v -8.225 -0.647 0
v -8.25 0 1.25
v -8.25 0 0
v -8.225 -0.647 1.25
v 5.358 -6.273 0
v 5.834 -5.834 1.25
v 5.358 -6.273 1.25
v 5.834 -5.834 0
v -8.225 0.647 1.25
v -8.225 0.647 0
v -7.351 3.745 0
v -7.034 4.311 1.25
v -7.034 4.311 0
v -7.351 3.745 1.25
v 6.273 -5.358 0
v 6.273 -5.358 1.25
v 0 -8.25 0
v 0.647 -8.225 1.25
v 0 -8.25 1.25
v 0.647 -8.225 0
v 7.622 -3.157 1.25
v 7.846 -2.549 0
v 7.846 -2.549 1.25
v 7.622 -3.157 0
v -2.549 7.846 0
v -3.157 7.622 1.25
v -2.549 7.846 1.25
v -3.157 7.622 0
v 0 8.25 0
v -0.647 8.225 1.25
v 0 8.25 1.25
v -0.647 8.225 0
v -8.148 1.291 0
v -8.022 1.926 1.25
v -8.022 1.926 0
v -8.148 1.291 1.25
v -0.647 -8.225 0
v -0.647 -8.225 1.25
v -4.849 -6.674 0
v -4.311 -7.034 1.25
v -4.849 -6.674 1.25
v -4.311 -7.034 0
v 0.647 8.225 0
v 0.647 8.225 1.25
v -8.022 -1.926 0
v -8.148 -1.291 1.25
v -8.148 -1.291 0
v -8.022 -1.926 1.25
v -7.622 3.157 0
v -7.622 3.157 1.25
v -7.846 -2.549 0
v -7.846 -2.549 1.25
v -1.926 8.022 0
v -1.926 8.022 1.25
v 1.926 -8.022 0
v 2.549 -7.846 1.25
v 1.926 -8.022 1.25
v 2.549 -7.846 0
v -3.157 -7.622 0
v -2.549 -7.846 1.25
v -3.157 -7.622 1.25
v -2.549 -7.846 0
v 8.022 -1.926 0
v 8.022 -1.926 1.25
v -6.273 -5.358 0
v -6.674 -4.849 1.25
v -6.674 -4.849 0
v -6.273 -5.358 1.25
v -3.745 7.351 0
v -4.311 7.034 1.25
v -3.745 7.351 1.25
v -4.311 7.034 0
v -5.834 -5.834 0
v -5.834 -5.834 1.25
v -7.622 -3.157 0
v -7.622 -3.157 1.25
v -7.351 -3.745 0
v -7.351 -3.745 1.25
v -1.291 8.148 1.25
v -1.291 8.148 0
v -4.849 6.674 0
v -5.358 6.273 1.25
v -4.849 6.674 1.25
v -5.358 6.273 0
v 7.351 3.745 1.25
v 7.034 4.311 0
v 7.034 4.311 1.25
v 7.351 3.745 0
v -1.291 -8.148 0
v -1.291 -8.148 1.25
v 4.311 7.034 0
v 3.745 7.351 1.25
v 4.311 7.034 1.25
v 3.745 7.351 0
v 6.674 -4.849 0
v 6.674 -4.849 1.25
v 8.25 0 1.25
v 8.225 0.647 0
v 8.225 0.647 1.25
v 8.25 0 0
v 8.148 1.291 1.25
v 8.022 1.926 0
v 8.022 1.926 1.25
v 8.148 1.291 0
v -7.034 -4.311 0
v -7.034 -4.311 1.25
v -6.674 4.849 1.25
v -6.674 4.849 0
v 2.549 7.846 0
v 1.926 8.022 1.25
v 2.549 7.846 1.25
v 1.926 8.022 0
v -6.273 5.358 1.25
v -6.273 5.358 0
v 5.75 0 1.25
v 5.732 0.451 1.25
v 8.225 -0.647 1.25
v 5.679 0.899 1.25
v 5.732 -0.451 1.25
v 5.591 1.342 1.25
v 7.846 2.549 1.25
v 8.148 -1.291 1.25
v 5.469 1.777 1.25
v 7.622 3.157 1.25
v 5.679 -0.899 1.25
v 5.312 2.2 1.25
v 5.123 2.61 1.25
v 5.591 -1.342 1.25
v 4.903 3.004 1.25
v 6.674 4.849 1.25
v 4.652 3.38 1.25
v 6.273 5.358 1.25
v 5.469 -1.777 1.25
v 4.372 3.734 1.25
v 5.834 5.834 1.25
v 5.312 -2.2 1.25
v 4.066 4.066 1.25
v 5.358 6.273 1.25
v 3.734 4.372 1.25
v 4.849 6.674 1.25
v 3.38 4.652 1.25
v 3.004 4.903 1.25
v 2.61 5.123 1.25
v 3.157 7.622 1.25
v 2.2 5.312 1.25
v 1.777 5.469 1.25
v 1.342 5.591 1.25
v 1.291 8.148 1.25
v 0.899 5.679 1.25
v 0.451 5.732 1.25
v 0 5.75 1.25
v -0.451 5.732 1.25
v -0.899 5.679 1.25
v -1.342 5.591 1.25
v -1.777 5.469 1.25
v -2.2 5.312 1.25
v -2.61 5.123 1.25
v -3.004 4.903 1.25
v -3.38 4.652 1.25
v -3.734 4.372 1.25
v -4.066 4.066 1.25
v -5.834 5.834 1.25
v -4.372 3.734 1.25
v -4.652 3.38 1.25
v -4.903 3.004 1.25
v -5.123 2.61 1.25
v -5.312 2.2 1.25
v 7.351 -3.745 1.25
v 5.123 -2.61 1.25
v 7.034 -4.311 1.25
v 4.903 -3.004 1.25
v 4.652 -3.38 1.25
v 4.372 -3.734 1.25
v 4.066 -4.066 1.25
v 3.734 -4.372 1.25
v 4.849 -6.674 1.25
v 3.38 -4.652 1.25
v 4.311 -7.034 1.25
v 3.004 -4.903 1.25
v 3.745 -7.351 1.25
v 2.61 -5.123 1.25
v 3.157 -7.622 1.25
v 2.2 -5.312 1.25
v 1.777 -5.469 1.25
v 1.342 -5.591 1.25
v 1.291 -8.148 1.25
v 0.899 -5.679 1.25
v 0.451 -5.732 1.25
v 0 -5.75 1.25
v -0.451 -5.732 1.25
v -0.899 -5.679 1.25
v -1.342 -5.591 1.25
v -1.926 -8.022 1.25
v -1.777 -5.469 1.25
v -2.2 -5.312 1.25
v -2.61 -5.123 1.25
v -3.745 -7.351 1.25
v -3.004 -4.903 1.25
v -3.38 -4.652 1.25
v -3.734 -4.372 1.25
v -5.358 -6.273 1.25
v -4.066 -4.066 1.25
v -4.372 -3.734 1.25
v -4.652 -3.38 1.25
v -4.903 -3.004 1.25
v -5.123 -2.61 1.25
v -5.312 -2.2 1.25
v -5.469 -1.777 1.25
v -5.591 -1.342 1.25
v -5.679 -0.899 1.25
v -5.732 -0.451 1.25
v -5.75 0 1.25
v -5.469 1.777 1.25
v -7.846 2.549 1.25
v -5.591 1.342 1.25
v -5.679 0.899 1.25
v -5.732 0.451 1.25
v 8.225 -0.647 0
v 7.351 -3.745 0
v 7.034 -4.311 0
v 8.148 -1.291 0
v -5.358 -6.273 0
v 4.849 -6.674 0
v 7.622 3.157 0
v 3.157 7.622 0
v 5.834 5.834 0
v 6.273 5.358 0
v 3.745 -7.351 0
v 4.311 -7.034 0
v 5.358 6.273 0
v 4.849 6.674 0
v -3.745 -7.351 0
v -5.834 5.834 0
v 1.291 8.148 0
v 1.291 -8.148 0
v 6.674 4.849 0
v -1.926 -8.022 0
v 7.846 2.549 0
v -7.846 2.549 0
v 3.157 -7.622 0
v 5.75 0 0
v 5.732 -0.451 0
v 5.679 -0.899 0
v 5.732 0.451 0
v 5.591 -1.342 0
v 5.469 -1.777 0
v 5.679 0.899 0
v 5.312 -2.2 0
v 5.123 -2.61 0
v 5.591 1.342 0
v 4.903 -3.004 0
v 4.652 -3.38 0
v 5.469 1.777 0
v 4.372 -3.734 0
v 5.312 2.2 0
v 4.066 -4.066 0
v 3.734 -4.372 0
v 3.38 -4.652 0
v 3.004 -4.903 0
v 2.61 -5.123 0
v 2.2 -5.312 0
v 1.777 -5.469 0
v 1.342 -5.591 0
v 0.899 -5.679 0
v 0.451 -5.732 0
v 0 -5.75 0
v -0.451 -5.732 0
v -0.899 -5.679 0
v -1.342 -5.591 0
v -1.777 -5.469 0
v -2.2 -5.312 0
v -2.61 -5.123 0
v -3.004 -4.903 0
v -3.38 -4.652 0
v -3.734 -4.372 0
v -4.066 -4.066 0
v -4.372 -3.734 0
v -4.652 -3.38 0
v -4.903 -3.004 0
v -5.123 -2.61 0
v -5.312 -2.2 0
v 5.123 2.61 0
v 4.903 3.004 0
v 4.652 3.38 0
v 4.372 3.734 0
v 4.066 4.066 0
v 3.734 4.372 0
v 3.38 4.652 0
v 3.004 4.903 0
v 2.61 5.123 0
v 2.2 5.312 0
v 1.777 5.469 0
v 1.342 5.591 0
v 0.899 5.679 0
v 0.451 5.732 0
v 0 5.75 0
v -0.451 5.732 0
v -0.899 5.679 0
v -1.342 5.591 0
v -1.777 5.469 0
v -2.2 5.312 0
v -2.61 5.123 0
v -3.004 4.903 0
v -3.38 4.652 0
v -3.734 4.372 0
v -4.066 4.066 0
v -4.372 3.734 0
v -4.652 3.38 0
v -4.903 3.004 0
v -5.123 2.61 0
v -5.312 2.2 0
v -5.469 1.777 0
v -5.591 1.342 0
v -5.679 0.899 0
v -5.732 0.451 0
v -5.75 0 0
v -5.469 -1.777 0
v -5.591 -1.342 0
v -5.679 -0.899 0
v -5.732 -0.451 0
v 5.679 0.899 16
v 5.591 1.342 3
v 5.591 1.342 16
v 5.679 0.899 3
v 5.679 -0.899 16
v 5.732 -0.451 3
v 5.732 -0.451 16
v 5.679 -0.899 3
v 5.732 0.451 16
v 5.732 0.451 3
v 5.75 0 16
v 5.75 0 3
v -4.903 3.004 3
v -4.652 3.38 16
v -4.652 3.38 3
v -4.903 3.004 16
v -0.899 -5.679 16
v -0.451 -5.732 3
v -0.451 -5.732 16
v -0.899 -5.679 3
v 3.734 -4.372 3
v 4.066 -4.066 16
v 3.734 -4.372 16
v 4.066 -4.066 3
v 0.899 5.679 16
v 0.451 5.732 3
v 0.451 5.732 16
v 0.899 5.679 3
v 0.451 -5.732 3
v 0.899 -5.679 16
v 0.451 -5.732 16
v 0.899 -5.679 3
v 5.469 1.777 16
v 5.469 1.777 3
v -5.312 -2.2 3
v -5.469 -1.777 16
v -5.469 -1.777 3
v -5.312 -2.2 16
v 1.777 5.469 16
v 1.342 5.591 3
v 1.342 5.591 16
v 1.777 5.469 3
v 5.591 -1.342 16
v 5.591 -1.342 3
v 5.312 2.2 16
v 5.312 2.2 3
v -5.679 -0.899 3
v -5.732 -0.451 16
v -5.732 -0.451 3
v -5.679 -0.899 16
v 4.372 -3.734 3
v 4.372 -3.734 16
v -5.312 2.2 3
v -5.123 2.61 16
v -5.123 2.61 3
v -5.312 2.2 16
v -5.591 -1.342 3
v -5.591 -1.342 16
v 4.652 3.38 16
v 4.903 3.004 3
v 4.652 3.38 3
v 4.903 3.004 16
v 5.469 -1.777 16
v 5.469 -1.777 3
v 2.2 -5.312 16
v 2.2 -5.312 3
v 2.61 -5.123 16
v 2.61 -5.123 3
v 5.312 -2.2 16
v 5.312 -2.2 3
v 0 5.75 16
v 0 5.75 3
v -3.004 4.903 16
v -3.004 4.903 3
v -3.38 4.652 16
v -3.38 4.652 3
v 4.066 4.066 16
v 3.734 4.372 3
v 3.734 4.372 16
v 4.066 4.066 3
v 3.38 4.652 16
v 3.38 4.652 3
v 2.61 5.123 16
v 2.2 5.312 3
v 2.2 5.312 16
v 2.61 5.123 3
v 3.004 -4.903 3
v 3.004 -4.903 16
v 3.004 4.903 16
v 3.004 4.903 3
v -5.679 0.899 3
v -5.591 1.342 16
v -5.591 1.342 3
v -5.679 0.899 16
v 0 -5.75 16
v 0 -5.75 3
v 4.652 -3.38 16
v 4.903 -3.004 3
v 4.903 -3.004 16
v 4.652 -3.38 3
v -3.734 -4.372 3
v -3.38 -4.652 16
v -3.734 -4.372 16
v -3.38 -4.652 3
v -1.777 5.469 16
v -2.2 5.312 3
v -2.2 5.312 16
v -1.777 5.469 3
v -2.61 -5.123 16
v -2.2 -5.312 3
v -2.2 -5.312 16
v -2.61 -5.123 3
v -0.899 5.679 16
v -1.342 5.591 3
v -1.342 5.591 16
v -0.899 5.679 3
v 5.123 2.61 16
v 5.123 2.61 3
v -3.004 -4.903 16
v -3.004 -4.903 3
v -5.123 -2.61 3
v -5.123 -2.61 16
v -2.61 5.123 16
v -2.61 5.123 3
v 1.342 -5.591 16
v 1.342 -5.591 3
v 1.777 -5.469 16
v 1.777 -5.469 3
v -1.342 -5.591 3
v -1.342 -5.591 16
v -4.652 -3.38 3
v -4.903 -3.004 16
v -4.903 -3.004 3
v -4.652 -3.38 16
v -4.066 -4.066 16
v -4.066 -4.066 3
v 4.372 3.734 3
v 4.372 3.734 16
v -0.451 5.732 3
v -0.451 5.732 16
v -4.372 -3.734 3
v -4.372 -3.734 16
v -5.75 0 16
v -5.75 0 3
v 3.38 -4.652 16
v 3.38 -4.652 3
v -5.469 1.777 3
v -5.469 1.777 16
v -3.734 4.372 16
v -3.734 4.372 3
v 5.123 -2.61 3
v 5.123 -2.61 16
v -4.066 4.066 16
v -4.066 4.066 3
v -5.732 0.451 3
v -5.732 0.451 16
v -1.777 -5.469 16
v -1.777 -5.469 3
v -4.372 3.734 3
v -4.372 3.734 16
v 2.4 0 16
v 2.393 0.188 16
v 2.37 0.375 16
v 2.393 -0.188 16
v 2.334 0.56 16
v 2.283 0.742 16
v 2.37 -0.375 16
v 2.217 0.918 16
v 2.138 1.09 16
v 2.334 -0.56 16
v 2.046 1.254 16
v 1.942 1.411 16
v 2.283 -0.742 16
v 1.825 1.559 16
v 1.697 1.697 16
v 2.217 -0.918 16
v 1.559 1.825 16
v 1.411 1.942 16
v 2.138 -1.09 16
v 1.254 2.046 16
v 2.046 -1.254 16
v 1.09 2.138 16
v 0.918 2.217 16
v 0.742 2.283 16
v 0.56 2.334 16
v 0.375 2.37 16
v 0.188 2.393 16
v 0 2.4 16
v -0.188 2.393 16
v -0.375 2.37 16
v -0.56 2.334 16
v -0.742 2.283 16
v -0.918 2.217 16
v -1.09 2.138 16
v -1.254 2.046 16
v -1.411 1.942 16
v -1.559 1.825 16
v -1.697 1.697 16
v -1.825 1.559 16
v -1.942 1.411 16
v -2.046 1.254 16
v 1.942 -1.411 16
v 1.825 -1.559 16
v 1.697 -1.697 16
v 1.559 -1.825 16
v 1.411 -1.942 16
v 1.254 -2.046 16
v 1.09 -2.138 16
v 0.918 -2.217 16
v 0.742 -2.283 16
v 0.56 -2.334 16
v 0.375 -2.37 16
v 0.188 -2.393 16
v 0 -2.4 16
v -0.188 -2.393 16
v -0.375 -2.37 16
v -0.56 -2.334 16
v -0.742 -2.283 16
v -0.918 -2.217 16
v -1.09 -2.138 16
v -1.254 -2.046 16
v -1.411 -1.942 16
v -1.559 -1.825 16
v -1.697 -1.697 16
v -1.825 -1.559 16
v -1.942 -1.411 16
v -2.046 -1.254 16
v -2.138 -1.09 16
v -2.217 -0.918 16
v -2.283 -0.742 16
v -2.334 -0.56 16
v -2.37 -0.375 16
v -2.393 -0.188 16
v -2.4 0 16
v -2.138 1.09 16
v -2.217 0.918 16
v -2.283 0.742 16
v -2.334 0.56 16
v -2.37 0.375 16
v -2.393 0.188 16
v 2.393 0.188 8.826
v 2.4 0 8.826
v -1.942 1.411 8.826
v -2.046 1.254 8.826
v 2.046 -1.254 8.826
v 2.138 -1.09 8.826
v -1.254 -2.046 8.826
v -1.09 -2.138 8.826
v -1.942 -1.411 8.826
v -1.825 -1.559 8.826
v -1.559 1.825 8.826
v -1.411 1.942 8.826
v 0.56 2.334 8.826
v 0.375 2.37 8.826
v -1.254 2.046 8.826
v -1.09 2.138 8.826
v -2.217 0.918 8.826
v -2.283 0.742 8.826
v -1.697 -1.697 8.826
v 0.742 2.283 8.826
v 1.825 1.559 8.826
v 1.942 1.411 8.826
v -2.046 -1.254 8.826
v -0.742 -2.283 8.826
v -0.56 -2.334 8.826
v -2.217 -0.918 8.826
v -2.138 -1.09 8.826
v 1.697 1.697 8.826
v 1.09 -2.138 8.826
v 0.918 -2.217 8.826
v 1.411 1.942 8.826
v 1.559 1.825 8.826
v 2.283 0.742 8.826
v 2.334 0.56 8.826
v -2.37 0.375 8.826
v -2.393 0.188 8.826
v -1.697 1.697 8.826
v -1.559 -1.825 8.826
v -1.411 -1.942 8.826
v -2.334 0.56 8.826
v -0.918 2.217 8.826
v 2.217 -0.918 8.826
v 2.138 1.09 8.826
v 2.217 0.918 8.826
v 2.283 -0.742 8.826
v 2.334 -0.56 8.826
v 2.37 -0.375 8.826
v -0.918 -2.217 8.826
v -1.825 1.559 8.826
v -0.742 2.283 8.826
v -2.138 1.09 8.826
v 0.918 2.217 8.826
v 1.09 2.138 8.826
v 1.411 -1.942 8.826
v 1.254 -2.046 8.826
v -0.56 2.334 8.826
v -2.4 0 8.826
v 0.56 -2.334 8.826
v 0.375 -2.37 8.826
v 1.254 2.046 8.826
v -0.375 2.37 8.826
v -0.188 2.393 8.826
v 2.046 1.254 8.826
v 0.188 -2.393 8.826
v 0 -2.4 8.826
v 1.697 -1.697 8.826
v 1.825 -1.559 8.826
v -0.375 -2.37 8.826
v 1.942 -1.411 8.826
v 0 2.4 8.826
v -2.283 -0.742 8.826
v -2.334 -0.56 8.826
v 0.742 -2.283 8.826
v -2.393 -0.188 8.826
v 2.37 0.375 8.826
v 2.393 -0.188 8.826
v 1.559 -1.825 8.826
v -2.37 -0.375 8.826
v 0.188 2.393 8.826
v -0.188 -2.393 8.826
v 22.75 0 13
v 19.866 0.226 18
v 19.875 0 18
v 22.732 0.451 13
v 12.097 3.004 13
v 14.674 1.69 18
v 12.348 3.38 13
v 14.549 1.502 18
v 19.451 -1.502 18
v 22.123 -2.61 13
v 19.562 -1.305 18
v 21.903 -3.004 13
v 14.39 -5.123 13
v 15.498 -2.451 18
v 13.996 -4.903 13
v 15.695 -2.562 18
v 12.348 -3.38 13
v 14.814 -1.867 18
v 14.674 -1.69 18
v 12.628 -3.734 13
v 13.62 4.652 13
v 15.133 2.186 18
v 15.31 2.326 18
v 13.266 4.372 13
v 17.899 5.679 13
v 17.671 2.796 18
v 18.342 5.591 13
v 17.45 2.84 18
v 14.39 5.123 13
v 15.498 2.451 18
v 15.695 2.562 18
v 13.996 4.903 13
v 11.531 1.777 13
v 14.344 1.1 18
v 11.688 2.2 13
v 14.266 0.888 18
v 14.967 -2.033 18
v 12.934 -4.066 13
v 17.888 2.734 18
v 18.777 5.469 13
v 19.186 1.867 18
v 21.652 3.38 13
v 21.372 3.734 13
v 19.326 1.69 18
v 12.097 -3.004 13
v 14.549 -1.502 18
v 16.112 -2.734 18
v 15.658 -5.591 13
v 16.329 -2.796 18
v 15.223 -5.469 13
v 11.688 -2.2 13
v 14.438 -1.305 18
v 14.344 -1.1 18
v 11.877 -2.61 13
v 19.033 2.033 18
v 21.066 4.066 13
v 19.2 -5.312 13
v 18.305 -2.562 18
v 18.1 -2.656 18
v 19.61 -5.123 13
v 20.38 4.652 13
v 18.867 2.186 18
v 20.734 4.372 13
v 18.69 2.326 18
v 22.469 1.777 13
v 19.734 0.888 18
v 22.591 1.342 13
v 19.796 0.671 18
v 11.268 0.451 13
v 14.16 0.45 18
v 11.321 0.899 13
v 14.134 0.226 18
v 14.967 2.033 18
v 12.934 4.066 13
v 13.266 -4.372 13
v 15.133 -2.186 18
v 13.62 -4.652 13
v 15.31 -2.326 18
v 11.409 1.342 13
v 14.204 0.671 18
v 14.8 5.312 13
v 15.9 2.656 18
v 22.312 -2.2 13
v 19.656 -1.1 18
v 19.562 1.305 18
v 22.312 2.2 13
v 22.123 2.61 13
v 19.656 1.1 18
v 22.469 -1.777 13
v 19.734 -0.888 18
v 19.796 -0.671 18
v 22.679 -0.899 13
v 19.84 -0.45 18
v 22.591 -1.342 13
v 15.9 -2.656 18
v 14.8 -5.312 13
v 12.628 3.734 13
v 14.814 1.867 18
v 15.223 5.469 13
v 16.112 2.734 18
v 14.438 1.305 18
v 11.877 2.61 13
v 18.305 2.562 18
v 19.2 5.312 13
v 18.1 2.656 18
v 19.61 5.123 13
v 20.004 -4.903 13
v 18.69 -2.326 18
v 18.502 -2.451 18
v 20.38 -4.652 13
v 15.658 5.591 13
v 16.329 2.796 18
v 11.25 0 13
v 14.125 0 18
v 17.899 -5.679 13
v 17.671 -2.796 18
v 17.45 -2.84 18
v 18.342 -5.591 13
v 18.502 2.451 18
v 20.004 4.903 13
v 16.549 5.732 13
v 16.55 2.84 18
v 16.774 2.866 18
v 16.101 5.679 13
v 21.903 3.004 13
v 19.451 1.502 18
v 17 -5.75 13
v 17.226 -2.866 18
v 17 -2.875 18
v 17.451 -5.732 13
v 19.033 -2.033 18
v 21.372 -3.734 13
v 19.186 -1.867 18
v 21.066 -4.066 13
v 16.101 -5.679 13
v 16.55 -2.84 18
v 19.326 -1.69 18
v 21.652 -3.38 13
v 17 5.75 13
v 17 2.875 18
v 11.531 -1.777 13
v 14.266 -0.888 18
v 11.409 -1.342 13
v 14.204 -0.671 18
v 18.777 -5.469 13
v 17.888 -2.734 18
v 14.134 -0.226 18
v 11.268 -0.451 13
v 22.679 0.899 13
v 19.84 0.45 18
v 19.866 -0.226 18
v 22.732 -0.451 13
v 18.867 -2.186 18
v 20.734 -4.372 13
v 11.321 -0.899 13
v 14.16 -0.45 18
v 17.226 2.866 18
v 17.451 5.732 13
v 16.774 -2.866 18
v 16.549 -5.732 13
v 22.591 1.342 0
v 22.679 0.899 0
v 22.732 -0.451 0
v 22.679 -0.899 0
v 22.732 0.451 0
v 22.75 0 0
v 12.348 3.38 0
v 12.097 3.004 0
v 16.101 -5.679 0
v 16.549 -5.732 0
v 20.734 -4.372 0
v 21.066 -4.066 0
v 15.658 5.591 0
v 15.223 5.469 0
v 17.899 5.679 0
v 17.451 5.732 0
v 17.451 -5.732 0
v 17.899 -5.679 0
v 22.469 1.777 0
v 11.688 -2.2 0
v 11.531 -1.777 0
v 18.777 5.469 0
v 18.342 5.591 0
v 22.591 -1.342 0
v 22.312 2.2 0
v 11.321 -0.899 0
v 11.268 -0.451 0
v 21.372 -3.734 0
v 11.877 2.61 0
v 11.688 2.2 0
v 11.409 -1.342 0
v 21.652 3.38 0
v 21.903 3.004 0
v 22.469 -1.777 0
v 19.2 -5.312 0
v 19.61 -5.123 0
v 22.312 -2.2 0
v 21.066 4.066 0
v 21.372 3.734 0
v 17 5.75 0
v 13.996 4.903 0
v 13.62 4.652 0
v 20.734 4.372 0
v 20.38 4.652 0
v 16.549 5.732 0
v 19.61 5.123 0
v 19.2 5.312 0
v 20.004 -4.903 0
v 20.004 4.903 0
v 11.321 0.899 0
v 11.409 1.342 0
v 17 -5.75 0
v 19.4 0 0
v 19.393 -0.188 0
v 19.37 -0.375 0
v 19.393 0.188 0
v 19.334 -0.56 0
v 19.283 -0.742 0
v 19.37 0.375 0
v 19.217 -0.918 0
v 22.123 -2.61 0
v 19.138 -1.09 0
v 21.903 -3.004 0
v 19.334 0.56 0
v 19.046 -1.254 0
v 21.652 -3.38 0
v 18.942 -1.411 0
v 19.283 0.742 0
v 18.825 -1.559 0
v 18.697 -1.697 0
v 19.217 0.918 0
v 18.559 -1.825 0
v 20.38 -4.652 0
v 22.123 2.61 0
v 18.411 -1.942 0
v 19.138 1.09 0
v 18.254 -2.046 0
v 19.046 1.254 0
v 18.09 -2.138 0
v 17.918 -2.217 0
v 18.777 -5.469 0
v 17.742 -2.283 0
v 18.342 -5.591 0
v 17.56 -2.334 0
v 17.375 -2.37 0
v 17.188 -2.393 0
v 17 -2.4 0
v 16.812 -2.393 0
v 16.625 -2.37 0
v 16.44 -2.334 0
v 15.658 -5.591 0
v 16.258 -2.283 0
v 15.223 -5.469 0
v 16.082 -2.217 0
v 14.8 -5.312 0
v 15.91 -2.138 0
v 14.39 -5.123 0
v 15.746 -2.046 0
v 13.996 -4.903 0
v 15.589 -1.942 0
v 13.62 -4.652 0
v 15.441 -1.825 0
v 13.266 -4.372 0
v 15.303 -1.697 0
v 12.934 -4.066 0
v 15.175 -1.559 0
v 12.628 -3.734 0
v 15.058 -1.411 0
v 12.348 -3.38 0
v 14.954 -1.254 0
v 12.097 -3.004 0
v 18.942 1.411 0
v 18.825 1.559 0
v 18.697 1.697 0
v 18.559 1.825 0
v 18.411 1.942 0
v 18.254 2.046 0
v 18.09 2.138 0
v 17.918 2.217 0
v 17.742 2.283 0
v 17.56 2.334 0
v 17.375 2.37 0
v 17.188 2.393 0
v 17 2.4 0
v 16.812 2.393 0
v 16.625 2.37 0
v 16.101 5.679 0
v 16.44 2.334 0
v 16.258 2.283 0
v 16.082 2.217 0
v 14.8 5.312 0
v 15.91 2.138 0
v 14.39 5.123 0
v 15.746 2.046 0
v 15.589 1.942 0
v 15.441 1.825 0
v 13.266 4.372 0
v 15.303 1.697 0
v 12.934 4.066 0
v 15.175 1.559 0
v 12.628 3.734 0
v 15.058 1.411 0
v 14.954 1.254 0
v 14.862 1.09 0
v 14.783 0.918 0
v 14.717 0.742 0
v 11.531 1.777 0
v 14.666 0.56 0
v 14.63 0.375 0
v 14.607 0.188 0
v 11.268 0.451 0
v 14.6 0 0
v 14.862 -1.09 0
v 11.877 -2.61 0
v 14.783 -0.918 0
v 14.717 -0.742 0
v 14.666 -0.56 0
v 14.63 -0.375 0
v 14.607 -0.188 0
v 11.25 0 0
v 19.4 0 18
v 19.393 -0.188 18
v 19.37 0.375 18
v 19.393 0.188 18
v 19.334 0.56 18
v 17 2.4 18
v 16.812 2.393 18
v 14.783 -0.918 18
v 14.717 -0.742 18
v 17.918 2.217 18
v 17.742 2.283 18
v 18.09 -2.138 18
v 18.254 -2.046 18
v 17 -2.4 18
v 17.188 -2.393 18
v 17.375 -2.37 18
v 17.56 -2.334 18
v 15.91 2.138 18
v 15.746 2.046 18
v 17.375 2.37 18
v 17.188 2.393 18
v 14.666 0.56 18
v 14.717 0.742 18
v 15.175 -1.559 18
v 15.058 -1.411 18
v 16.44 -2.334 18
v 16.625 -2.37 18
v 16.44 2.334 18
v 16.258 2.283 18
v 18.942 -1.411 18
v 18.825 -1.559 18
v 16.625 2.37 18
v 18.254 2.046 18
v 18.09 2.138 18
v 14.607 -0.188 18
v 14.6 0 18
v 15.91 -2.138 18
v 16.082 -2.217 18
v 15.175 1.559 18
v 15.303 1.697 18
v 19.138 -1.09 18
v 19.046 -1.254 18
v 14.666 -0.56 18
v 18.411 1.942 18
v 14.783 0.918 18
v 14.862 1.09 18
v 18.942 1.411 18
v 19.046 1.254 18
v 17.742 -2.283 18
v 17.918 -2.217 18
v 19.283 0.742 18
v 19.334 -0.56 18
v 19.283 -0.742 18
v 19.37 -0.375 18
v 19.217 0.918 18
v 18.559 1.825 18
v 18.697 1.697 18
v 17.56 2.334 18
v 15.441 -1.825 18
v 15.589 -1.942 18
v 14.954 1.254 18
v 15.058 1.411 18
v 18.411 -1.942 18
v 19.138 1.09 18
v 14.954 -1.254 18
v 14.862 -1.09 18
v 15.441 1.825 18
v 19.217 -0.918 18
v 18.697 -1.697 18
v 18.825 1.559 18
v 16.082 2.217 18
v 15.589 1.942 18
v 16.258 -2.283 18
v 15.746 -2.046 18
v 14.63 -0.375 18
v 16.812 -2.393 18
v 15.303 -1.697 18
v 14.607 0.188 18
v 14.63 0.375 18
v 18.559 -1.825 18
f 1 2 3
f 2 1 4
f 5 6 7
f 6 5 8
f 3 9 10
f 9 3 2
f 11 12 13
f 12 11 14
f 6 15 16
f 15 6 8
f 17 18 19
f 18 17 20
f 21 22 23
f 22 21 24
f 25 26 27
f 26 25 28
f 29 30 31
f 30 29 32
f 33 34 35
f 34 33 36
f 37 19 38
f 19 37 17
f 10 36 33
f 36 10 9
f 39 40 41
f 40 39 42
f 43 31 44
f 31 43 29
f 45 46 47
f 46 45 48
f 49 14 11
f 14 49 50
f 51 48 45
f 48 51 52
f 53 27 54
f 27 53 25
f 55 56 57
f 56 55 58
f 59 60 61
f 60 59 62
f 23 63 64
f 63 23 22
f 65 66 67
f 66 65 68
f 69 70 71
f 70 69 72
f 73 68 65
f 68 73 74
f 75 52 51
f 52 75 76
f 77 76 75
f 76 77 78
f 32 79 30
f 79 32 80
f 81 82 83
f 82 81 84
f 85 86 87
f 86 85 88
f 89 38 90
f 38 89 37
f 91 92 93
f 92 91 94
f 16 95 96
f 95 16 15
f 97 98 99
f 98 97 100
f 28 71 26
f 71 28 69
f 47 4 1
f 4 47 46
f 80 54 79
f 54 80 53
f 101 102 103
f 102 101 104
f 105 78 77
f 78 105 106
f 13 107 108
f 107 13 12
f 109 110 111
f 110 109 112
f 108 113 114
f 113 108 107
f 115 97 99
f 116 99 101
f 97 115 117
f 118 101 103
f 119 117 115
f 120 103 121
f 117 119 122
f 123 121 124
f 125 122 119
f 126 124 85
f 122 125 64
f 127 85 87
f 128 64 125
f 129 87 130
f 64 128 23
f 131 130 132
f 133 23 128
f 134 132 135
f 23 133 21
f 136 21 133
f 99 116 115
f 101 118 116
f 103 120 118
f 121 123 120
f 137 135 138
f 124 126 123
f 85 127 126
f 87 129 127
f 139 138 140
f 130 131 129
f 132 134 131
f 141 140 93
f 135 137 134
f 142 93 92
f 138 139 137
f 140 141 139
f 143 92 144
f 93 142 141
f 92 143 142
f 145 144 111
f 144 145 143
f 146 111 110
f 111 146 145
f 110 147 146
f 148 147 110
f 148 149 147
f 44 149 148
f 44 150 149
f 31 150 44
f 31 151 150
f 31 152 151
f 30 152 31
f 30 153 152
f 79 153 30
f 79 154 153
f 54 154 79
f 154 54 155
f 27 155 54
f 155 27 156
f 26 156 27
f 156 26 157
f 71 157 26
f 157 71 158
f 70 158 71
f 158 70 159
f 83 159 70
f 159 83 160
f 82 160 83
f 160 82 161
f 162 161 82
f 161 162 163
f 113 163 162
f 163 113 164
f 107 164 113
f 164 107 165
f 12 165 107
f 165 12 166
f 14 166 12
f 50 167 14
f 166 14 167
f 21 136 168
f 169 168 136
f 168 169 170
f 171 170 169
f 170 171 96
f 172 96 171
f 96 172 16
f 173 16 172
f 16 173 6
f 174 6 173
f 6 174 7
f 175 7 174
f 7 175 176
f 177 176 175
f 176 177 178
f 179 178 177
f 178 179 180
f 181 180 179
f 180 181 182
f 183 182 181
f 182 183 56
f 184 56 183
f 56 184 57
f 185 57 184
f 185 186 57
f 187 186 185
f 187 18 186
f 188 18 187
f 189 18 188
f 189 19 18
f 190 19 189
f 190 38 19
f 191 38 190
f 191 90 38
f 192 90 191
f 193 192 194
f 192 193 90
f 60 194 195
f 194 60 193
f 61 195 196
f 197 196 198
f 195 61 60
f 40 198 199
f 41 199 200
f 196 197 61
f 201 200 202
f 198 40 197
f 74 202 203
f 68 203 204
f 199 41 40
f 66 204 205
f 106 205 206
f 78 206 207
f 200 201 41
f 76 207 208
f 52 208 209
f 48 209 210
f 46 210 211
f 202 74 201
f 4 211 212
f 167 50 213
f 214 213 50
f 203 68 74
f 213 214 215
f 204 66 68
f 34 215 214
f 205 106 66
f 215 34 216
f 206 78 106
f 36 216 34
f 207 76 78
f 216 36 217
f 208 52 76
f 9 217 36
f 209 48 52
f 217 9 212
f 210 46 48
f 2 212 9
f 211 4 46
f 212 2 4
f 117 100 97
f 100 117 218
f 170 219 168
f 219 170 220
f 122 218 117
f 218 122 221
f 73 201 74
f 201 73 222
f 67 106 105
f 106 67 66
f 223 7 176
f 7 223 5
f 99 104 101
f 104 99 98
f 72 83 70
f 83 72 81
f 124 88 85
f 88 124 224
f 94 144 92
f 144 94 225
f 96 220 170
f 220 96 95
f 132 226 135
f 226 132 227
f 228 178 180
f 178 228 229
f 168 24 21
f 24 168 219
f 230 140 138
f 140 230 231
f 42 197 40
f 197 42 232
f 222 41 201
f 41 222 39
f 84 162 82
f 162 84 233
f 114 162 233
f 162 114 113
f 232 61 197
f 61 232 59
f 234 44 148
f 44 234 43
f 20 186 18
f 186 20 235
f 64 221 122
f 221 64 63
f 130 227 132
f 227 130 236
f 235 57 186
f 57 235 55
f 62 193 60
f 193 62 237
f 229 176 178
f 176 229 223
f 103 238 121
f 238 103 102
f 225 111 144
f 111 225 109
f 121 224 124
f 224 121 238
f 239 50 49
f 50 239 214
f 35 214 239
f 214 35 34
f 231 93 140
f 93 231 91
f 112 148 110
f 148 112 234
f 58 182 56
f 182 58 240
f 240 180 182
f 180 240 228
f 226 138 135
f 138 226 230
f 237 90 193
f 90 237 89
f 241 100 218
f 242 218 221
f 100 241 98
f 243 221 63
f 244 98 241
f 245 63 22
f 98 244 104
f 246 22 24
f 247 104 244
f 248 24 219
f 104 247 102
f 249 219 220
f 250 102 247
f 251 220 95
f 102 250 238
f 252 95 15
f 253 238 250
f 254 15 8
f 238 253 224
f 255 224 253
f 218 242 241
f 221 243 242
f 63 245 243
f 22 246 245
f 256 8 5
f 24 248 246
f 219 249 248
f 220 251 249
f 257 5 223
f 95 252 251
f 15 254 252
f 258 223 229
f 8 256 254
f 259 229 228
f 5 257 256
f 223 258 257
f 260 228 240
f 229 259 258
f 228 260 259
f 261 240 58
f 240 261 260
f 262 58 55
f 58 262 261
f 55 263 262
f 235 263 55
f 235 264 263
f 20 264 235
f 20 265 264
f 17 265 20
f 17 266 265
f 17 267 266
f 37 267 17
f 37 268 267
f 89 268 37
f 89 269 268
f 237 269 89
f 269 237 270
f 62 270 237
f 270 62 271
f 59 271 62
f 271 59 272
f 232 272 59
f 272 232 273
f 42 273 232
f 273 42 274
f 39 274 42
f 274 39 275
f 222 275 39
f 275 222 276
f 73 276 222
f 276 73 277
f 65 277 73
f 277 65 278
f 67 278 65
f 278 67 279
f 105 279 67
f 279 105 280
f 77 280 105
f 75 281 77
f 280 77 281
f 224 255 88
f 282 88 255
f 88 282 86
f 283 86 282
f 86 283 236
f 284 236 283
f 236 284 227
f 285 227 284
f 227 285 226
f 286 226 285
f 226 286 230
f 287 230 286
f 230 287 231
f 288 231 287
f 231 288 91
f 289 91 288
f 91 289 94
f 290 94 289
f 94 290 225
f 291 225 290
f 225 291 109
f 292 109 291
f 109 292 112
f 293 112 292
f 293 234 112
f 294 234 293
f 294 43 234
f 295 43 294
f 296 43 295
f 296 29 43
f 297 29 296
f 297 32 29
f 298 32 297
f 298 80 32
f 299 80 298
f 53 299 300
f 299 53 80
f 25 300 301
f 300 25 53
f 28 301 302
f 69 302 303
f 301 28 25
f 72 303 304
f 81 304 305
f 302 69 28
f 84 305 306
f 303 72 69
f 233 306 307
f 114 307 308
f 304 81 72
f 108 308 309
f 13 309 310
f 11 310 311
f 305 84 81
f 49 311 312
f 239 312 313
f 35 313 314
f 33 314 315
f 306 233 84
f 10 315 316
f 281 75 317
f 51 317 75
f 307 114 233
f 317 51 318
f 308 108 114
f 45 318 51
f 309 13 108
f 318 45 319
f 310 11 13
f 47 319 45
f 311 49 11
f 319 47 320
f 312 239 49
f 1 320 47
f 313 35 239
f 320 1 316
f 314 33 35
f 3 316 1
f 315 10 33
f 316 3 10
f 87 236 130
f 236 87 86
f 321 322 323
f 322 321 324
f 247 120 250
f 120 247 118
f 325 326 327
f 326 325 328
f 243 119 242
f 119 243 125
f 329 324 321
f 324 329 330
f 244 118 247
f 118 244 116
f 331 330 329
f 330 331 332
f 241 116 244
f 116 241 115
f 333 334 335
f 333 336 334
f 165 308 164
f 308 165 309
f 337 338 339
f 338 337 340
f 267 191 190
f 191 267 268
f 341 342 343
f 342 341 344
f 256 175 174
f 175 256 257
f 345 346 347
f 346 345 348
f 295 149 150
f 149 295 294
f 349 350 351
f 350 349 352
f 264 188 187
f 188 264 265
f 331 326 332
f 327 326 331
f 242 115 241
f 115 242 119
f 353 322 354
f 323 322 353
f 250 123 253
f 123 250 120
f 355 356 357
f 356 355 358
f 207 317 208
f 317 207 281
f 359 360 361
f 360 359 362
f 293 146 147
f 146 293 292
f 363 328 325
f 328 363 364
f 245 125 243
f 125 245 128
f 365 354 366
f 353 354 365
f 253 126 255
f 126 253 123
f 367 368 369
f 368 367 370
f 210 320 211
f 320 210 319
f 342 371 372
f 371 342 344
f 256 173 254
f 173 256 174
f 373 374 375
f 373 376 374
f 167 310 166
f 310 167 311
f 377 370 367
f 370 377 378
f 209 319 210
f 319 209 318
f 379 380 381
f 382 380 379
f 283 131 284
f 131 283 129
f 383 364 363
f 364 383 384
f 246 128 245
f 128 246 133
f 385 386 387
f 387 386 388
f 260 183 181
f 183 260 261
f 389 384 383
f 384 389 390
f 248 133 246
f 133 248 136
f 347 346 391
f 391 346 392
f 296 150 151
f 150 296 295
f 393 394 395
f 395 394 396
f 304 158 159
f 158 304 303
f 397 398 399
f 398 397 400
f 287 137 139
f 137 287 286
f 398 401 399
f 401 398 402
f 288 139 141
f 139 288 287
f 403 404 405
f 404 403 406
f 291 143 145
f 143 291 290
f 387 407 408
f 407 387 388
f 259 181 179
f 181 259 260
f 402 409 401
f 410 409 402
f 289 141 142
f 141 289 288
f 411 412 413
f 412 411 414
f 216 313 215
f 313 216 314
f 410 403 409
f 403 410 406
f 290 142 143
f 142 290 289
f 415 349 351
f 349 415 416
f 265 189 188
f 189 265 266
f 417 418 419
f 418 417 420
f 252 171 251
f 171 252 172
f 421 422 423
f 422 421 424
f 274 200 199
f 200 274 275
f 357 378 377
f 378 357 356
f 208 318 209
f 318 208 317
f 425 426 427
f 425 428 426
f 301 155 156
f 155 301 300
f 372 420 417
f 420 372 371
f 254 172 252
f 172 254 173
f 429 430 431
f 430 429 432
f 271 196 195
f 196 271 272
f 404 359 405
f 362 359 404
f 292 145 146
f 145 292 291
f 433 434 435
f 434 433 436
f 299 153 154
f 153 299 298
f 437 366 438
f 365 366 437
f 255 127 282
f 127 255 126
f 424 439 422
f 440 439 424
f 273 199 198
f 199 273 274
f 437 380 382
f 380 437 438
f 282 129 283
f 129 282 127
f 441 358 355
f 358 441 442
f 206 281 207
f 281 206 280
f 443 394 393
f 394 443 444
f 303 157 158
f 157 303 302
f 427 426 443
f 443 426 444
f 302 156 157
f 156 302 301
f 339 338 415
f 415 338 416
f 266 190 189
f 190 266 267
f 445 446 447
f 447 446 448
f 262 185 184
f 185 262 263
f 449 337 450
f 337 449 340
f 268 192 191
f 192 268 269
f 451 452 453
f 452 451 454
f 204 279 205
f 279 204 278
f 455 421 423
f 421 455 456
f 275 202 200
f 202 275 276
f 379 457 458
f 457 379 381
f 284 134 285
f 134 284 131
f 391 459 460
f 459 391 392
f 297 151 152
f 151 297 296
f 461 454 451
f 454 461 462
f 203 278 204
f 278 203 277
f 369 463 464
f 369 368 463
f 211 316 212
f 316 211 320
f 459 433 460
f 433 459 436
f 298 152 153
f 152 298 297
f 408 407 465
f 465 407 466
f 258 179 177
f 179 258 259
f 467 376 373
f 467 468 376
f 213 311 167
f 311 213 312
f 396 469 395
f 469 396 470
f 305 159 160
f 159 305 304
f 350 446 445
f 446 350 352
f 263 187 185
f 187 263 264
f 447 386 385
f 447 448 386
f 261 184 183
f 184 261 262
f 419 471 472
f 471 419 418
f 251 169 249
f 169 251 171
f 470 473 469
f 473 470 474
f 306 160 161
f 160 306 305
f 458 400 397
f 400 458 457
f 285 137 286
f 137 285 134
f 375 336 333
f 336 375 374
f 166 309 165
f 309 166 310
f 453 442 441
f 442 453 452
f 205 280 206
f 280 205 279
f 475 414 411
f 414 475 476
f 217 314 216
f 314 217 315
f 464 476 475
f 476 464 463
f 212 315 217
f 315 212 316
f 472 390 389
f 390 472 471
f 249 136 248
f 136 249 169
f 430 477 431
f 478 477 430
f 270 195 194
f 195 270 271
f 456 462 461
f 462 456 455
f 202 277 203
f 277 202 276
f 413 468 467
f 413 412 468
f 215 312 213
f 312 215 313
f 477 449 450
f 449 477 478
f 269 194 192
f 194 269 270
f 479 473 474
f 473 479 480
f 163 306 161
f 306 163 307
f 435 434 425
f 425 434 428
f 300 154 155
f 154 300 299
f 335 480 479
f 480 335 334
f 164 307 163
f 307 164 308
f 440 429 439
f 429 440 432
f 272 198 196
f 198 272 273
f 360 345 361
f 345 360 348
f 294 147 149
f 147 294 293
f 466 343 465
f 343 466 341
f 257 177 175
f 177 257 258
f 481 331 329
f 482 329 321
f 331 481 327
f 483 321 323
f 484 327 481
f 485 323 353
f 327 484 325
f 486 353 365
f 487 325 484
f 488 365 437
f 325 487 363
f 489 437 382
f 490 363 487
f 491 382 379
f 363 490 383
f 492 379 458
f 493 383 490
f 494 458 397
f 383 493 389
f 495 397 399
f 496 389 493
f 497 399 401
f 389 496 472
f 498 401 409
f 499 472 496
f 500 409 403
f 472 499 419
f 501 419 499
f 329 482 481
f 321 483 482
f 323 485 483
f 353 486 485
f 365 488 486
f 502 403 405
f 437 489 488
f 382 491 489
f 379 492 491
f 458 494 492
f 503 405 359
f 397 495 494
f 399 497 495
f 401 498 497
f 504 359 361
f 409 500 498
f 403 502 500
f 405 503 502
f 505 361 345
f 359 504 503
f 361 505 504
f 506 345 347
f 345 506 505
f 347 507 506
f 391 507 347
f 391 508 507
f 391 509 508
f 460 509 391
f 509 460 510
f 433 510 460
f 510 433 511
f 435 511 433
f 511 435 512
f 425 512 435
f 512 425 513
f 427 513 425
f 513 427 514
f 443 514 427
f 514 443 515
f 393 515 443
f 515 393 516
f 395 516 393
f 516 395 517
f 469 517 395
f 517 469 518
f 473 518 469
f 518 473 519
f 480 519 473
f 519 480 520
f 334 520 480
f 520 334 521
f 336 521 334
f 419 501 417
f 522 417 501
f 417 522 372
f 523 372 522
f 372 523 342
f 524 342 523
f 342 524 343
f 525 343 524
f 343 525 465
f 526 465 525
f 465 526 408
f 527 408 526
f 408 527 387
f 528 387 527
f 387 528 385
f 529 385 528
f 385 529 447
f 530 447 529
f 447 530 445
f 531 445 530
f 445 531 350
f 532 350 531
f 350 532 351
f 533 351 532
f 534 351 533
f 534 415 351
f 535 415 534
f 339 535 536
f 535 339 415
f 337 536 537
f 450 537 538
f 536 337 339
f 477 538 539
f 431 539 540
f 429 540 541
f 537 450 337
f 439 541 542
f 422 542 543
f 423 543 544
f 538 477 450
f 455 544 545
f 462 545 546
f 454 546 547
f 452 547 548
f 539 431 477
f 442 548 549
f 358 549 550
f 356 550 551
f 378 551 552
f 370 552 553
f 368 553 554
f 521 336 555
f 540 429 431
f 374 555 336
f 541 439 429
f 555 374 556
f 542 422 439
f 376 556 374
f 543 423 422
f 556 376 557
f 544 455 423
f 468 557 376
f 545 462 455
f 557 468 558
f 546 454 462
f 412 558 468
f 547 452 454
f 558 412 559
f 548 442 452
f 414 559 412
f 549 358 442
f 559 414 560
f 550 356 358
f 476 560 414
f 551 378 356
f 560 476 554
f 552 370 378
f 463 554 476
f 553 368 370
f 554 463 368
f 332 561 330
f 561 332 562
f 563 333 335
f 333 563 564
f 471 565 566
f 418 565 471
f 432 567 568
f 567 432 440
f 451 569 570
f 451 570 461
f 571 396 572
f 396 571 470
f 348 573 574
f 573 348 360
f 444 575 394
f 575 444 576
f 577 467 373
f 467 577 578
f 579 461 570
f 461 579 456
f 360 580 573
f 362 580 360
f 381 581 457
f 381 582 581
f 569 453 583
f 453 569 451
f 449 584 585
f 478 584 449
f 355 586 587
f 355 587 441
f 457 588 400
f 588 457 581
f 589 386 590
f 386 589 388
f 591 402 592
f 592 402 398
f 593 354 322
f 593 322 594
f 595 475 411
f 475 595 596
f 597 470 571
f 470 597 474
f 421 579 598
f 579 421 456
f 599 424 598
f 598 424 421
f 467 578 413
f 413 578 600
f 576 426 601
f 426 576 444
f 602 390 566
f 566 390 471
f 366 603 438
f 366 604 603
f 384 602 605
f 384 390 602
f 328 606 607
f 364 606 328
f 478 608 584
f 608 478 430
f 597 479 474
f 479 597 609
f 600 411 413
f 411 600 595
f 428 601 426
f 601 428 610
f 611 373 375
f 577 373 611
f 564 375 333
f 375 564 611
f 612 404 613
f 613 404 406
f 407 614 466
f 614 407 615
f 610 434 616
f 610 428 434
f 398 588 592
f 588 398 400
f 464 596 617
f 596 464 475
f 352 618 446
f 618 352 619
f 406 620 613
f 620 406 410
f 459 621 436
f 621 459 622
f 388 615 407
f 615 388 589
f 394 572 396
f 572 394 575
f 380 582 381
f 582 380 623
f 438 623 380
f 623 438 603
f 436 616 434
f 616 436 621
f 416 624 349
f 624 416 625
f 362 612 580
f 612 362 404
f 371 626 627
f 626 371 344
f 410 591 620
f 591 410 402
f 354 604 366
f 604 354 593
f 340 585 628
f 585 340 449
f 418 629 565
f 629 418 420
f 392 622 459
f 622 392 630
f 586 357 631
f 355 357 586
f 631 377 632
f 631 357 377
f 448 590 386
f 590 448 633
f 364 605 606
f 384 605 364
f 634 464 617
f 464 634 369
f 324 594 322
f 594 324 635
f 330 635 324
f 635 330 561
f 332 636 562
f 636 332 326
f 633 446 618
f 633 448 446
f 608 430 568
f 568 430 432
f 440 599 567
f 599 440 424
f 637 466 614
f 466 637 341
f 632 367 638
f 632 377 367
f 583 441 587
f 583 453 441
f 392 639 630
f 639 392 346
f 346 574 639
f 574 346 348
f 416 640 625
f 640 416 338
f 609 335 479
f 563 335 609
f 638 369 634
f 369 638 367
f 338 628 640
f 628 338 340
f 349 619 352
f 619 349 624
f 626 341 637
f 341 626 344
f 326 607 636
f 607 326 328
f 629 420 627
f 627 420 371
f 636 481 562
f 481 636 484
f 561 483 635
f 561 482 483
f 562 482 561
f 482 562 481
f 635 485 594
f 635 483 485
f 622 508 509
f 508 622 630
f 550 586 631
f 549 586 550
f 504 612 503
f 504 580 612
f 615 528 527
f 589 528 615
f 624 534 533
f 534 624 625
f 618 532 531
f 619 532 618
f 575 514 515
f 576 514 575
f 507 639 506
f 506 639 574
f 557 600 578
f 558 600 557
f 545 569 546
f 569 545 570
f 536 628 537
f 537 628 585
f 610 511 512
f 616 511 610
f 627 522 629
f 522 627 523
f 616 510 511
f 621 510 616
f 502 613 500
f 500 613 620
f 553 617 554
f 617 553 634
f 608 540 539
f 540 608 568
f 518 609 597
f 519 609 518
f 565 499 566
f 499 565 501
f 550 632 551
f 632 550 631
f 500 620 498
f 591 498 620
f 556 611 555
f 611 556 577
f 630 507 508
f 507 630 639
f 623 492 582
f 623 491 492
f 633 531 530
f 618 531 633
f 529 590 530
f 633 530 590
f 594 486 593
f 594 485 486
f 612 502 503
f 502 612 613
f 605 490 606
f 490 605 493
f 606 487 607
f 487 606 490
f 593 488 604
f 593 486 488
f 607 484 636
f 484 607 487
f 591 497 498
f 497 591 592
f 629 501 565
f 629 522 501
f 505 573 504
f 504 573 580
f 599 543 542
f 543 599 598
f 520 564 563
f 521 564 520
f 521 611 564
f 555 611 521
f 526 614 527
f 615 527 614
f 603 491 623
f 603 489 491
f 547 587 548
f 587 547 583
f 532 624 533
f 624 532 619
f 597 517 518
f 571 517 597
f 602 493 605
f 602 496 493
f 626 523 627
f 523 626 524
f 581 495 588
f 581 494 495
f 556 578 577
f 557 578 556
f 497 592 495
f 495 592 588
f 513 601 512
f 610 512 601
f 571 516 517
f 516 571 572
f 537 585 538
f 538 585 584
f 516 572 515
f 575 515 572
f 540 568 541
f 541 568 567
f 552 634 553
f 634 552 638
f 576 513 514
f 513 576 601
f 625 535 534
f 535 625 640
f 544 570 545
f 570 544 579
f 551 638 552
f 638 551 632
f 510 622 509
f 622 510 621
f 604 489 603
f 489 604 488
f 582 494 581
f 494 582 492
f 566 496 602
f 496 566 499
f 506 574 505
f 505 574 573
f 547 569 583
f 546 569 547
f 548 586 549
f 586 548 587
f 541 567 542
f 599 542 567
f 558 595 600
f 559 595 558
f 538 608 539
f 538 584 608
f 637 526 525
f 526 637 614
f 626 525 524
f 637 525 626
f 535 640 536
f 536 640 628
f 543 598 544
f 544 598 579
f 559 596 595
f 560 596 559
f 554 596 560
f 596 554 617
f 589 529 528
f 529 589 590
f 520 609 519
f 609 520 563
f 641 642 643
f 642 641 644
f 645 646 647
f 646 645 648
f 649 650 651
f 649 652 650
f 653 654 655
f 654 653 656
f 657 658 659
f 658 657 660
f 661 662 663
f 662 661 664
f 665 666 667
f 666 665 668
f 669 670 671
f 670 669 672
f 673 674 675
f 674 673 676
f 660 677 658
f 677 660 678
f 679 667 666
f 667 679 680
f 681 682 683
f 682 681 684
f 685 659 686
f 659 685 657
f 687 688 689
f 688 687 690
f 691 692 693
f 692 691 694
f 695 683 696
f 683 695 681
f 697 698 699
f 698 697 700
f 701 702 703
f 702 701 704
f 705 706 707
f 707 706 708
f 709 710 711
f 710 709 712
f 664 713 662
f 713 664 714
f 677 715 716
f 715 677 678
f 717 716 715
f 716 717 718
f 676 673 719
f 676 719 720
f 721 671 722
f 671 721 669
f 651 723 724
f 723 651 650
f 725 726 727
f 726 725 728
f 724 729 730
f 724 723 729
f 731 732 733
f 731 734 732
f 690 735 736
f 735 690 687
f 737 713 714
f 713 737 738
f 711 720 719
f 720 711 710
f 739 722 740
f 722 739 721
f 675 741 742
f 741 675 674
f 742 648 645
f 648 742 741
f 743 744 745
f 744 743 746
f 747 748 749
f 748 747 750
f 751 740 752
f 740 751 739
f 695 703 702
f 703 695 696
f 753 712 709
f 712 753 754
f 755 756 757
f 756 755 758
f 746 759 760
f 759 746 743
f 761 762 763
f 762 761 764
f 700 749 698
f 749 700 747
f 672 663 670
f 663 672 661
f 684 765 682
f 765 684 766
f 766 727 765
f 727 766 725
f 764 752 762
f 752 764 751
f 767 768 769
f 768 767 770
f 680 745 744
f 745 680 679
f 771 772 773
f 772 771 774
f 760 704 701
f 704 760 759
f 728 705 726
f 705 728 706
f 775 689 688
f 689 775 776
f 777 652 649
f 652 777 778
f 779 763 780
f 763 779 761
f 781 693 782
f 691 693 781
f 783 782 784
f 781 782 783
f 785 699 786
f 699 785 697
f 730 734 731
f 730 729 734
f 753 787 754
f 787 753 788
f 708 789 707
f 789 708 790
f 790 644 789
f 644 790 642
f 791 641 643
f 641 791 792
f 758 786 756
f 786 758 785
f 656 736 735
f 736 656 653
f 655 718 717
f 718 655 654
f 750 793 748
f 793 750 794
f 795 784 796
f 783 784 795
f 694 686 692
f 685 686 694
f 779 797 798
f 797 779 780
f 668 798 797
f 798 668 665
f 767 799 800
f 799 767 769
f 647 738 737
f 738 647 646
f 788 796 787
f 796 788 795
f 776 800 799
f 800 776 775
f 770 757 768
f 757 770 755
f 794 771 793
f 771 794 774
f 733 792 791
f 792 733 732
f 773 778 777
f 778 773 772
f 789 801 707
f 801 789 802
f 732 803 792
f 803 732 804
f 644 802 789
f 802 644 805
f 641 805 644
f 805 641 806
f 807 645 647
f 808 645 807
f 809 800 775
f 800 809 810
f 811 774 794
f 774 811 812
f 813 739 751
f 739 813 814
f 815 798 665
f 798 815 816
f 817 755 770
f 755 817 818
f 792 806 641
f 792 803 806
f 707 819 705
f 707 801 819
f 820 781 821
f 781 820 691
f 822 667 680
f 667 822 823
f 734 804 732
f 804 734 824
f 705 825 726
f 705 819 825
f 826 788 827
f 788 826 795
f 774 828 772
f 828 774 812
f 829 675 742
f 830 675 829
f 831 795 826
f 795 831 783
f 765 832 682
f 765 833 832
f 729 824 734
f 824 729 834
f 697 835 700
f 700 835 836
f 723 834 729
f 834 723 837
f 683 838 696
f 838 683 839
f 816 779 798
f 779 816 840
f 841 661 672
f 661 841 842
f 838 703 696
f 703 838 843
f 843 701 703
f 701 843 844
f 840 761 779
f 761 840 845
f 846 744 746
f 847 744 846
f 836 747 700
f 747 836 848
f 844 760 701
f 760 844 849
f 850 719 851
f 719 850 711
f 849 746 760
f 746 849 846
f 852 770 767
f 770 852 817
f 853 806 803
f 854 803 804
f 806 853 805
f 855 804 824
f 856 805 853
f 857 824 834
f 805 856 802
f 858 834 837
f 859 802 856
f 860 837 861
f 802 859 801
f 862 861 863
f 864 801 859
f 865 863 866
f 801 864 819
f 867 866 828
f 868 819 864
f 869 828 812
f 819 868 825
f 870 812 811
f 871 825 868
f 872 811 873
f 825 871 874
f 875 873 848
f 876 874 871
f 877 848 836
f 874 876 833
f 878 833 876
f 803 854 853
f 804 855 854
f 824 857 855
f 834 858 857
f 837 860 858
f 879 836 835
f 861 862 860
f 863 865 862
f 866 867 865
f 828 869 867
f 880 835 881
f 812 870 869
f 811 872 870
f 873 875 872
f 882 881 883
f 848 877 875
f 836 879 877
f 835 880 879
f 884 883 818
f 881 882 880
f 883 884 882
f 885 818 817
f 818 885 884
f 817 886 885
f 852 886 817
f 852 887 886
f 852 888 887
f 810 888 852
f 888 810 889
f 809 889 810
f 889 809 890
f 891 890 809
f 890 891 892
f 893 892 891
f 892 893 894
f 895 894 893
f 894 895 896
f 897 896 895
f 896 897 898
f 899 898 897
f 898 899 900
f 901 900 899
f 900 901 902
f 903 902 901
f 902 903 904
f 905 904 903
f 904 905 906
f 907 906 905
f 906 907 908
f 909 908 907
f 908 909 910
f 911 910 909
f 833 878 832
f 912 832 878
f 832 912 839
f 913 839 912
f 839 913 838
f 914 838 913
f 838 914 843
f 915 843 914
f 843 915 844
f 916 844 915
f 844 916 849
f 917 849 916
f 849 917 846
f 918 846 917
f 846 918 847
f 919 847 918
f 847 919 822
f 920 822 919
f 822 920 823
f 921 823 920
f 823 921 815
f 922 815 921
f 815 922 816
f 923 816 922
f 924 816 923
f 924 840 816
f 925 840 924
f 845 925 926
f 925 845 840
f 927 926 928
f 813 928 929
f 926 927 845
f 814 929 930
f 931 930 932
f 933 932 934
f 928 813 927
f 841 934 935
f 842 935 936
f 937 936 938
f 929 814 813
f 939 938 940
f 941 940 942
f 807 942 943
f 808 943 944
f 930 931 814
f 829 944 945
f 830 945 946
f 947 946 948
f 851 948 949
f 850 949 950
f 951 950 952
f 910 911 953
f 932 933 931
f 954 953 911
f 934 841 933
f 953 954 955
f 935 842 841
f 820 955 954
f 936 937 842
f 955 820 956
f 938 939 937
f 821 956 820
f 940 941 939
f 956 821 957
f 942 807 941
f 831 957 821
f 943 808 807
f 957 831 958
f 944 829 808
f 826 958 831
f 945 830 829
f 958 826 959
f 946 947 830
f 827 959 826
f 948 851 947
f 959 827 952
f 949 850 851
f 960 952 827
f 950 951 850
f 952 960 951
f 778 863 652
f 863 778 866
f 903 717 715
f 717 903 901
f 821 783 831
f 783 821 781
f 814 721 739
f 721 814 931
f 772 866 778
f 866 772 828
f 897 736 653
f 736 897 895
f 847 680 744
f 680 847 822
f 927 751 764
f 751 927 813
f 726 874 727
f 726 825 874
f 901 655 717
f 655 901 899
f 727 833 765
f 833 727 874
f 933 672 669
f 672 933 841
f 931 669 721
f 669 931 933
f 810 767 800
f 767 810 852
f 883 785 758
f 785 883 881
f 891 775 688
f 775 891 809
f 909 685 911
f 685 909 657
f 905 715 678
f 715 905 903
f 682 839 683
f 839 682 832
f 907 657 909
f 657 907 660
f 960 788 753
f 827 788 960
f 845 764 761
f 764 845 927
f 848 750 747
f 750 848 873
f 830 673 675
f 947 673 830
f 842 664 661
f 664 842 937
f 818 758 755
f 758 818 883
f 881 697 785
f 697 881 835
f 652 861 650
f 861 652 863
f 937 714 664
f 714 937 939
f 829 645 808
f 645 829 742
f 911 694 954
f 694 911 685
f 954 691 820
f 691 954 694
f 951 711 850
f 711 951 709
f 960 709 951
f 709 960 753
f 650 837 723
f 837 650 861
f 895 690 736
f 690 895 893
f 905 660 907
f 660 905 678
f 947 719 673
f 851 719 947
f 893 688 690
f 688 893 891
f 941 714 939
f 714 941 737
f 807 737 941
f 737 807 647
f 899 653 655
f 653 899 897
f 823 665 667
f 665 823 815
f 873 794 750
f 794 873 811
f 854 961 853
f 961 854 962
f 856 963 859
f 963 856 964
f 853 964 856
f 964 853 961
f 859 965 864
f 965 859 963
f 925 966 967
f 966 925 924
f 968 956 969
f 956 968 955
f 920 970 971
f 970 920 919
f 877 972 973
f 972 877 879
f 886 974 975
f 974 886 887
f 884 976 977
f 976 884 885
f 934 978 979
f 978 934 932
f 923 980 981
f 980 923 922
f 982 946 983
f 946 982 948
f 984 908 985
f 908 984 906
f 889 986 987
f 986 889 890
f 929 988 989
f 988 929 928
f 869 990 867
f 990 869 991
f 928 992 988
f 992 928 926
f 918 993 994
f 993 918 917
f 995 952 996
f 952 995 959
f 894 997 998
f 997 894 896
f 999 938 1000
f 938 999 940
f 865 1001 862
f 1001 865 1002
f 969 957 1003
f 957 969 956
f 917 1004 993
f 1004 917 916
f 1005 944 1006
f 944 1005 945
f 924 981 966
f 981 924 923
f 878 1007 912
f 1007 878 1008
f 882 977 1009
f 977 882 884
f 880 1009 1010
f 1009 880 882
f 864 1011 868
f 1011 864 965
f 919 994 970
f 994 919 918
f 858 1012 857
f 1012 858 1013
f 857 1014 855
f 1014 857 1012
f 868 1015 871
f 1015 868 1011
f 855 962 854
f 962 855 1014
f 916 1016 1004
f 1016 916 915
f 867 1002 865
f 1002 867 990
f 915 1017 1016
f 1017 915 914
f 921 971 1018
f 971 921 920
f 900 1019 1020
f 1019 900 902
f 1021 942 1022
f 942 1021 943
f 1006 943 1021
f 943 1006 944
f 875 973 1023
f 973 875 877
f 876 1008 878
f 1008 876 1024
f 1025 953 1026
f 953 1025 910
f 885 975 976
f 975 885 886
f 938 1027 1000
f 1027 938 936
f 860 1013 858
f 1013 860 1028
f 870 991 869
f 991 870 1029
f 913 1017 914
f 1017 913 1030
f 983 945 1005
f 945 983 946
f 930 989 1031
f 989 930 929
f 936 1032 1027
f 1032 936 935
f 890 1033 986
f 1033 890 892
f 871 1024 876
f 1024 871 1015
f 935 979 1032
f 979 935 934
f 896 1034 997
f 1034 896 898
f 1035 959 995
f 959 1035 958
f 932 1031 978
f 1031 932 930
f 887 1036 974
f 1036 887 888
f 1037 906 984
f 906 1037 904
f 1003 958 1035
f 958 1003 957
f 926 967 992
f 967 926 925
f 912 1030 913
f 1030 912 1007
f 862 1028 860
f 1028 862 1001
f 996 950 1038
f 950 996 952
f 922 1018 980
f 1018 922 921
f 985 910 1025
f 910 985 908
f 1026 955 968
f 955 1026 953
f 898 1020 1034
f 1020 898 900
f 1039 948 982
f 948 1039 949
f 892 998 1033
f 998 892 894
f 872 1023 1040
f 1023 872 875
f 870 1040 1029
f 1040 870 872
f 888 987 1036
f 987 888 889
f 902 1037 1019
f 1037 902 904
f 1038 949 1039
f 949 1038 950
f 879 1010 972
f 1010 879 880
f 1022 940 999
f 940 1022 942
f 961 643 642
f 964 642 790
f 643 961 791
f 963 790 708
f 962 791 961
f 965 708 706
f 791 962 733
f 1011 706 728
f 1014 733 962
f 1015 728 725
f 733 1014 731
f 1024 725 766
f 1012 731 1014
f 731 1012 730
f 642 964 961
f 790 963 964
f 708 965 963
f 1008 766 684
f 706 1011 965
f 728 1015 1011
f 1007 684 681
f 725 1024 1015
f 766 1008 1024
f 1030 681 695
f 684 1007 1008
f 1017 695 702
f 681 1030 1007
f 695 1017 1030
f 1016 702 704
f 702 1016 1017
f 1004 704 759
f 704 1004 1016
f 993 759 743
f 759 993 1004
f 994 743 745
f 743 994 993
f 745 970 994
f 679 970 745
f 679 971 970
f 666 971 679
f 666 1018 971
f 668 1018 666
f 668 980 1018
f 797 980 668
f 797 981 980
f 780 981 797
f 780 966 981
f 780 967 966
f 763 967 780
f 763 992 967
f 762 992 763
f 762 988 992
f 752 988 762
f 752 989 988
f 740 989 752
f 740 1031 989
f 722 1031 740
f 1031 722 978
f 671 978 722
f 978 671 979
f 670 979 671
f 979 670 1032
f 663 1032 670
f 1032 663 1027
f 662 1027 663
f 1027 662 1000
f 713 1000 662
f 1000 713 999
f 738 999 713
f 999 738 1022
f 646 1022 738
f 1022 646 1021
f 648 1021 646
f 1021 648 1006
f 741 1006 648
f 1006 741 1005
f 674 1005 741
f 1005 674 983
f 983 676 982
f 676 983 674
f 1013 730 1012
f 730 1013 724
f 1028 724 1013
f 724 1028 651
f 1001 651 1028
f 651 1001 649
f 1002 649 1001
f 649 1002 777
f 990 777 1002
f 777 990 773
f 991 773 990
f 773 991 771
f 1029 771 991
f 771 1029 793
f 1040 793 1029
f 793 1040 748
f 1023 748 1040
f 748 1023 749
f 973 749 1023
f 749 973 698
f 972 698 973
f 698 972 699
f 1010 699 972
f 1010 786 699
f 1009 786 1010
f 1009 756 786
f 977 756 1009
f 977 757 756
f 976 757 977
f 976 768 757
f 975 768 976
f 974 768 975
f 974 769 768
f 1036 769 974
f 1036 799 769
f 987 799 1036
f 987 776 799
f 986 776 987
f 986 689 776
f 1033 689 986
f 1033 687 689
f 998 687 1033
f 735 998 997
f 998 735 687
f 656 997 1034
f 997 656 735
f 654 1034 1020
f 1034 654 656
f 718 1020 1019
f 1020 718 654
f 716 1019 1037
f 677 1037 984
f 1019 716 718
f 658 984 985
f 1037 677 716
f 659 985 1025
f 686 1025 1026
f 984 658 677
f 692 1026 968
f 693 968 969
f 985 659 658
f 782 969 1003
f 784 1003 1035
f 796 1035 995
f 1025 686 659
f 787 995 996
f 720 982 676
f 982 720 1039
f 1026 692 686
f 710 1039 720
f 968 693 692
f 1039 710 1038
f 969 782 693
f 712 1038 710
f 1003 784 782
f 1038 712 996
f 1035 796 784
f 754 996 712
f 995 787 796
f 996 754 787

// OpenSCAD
// file: common.scad
// Measurements and routines common across adapters.

band_full_thickness = 1.25;    // thickest point of the band
band_full_diameter = 16.5;  // diameter at widest point of band

// profile = [
//     [0,0],
//     [band_edge_diameter / 2, 0],
//     [band_full_diameter / 2, (band_full_thickness - band_edge_thickness) / 2],
//     [band_full_diameter / 2, band_full_thickness - ((band_full_thickness - band_edge_thickness) / 2)],
//     [band_edge_diameter / 2, band_full_thickness],
//     [0,band_full_thickness],
// ];

profile = [
    [0,0],
    [band_full_diameter / 2, 0],
    [band_full_diameter / 2, band_full_thickness],
    [0,band_full_thickness],
];

module band() {
    rotate_extrude($fn=80) polygon(points=profile);
}
// main file
// Plotter pen adapter for Pentel Slicci gel pens
//
// Modified by Sasha Kovar <sasha-thing@arcocene.org>
// from a design by Brian Boucheron <brian@boucheron.org>

include <common.scad>;

body_outer_diameter = 11.5;
body_inner_diameter = 4.8;
body_height1 = 16;
body_height2 = 19;

module top(clip) {
	difference() {
		cylinder(r=body_outer_diameter/2, h=body_height2, $fn=80);
		cylinder(r=body_inner_diameter/2, h=50, $fn=80);
		translate([0,0,3]) cutout();
		if (clip) {
			translate([-5, -5, 18]) cube([10,10,2]);
		}
	}
}

module cutout() {
	difference() {
		cylinder(r=body_outer_diameter, h=20, $fn=80);
		cylinder(r1=body_outer_diameter, r2=0, h=20, $fn=80);
	}
}

union() {
	difference() {
		union() {
			band();
			cylinder(r=body_outer_diameter/2, h=body_height1, $fn=80);
		}

		translate([0,0,-10]) cylinder(r=body_inner_diameter/2, h=50, $fn=80);
		
		translate([0,0,-10]) {
			top();
		}
	}

	translate([17,0,0]) {
		top(true);
	}
}
